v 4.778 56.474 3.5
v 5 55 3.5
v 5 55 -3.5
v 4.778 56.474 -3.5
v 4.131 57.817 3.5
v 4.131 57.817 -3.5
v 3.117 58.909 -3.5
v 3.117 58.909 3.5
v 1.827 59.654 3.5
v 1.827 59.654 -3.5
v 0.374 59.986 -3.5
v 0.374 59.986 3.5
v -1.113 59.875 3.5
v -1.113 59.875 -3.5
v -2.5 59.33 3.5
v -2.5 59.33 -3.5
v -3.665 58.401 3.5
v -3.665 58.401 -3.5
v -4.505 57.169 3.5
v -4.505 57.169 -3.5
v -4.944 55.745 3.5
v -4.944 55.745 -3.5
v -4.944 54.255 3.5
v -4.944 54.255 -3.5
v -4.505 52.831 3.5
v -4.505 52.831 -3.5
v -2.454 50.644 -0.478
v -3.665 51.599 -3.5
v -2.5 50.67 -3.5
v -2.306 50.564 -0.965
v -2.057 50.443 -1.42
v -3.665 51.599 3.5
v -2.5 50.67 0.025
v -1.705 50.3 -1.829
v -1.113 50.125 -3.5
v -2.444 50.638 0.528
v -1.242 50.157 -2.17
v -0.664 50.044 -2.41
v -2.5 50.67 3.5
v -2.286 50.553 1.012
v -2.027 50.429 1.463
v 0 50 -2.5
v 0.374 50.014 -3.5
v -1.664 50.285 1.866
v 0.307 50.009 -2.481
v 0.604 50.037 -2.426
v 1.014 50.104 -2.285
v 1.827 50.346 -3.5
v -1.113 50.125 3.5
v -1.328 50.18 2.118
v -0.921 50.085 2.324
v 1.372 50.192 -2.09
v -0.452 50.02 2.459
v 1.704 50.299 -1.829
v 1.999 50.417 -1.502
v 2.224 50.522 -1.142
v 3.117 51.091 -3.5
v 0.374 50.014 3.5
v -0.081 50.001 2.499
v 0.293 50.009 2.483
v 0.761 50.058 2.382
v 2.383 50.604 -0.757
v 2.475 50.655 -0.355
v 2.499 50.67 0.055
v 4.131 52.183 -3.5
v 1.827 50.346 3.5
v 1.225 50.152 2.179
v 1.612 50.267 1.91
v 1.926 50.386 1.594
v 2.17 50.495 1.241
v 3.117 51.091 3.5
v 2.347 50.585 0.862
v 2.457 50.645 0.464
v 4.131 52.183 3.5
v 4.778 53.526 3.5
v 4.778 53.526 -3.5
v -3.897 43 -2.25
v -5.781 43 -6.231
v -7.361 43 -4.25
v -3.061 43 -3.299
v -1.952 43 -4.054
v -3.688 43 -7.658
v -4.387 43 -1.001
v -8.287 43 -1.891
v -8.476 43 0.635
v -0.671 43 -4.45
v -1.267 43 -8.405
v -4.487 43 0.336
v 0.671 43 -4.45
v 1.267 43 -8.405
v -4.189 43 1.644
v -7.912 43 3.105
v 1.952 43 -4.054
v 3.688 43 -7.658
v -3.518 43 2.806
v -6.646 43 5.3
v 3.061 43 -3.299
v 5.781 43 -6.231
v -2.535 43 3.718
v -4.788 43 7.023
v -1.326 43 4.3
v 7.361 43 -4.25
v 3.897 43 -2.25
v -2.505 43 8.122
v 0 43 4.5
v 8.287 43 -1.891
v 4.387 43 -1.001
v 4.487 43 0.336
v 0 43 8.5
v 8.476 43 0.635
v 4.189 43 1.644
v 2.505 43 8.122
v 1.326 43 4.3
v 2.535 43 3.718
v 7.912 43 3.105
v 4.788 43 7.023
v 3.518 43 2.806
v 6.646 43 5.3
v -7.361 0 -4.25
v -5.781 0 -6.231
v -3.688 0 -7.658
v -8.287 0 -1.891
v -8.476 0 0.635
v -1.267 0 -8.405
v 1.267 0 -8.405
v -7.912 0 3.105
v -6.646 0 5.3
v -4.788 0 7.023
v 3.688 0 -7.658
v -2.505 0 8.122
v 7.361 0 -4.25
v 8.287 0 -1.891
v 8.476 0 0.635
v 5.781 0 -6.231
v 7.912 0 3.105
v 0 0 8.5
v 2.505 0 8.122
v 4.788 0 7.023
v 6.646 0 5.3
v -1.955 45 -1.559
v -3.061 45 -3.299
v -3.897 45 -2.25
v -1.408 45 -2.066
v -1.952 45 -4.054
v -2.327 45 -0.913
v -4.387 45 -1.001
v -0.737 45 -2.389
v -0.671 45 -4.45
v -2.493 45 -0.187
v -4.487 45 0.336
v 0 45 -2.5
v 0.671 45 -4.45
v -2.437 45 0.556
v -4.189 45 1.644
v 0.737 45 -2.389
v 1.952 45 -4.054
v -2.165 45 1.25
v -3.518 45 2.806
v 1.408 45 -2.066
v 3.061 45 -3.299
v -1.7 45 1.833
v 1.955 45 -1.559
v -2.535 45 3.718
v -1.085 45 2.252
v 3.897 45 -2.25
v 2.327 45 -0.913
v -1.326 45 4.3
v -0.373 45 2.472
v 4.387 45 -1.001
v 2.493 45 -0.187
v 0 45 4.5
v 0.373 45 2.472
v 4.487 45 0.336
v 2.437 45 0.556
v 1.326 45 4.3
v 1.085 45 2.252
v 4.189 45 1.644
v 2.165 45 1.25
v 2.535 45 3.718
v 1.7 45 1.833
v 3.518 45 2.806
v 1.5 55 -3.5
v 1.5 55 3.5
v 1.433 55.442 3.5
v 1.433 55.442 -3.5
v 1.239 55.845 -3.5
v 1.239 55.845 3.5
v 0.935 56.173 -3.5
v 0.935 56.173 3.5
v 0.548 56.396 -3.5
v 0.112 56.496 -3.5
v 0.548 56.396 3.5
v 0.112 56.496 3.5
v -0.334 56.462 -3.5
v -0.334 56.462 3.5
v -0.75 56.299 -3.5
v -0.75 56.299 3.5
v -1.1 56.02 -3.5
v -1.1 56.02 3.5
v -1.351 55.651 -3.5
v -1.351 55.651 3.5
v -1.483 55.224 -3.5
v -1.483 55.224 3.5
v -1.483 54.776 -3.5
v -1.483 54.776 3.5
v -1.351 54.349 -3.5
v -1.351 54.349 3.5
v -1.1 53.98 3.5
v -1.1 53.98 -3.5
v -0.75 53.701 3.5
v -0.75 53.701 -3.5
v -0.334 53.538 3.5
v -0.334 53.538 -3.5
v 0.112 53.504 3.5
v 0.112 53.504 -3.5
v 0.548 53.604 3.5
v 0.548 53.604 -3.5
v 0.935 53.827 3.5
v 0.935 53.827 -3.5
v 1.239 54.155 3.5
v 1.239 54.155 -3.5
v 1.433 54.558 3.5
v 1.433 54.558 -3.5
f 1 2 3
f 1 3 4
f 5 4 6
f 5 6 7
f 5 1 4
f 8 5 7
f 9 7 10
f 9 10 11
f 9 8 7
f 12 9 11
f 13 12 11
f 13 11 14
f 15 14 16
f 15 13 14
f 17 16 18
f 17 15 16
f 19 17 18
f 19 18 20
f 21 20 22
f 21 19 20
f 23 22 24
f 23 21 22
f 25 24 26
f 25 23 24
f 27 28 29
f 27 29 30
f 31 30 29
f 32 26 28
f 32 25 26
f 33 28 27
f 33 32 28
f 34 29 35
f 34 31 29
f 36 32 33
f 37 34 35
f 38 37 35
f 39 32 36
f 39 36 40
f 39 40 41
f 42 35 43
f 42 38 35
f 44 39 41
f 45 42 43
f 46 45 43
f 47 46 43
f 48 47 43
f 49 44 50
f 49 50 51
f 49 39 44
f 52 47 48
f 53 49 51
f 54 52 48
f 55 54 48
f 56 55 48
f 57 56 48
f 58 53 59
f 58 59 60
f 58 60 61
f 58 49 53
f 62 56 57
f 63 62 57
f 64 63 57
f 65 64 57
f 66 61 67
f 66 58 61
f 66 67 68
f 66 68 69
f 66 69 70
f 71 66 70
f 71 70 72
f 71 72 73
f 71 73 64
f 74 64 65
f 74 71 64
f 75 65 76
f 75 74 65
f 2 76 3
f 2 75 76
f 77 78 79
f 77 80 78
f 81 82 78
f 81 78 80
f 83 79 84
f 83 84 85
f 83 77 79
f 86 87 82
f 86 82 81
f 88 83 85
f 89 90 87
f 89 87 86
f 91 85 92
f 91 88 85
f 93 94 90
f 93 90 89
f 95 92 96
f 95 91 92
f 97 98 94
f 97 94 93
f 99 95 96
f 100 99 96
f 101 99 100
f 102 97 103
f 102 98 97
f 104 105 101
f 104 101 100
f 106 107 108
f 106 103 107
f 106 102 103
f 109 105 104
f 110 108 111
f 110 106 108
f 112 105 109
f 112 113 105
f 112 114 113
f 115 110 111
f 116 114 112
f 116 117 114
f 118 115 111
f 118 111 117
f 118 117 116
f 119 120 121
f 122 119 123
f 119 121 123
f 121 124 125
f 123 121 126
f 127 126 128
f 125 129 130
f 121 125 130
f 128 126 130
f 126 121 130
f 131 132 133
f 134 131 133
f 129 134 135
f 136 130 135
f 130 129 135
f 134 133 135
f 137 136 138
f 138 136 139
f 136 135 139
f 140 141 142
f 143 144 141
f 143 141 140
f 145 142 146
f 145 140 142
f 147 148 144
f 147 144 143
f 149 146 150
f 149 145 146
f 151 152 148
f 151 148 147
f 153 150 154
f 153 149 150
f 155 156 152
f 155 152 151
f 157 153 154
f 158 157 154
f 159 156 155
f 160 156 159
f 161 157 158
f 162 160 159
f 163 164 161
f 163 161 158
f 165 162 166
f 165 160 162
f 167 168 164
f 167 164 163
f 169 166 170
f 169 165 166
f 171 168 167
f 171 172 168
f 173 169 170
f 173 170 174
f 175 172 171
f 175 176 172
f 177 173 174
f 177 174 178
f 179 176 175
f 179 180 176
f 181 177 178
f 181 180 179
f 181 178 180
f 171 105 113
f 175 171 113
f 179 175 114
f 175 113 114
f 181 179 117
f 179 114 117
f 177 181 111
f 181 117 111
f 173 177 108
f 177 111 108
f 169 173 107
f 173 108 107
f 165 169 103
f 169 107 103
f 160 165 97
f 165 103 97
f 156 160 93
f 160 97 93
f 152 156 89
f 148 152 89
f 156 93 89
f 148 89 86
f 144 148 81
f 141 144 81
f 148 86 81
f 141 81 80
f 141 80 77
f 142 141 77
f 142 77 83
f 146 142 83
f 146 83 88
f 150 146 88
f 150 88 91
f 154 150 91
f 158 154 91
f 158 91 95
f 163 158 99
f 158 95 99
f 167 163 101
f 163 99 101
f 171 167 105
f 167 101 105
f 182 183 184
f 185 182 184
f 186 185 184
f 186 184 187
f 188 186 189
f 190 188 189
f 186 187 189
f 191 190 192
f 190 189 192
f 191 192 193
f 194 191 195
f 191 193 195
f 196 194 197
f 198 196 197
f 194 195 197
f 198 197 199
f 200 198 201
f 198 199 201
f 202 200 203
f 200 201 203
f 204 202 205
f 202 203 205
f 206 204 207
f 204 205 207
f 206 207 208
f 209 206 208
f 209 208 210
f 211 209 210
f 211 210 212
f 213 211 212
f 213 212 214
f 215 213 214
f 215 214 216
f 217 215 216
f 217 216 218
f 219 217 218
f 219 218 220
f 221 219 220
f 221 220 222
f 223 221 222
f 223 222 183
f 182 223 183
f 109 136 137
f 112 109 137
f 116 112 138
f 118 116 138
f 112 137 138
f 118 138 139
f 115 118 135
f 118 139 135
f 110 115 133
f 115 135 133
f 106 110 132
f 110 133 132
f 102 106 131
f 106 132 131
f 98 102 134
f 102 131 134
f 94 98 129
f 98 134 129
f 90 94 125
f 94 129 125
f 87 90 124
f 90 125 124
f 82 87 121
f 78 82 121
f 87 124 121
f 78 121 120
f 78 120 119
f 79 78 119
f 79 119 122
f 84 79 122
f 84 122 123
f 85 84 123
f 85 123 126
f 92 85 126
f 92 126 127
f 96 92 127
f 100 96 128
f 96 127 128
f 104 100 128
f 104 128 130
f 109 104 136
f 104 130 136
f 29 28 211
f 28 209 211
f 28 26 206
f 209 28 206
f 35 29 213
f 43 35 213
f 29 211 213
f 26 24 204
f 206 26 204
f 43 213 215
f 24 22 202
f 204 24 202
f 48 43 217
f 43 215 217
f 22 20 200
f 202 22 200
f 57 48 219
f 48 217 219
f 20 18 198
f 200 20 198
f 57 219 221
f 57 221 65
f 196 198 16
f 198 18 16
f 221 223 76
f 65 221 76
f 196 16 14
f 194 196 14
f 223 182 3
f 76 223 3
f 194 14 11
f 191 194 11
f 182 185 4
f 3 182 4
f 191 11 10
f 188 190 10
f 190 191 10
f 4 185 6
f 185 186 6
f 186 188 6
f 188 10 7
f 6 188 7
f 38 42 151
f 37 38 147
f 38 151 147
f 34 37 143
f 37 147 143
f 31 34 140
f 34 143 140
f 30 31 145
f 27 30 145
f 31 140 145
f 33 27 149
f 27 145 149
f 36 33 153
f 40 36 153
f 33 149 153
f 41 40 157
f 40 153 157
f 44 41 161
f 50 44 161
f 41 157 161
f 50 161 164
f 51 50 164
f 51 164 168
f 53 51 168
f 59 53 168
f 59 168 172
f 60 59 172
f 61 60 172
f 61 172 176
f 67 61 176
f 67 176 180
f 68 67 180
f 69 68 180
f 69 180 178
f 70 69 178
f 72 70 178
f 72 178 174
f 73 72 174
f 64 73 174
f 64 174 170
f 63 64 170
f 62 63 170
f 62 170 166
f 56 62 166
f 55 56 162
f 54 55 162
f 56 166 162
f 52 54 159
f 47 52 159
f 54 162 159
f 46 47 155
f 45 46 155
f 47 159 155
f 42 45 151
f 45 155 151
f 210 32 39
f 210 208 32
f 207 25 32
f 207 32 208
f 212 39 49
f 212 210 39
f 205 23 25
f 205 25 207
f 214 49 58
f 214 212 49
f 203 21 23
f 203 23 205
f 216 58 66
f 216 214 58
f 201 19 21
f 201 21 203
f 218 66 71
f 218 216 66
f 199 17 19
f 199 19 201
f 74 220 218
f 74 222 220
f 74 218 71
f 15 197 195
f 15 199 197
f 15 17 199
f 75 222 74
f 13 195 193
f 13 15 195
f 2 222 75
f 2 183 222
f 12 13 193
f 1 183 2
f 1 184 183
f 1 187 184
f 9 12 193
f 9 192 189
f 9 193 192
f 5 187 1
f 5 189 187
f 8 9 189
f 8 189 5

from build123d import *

# Parameters (mm, degrees)
SKETCH_1_R          = 8.5
EXTRUDE_1_DEPTH     = 43
SKETCH_2_R          = 5
EXTRUDE_2_DEPTH     = 3.5
SKETCH_3_R          = 2.5
EXTRUDE_3_DEPTH     = 9
SKETCH_4_R          = 1.5
CUT_EXTRUDE_1_DEPTH = 10
SKETCH_5_R          = 4.5
SKETCH_5_R_2        = 2.5
EXTRUDE_4_DEPTH     = 2


with BuildPart() as part:
    # 草图1 → 凸台-拉伸1 (new body)
    with BuildSketch(Plane(origin=(0, 0, 0), x_dir=(1, 0, 0), z_dir=(0, 1, 0))):
        with Locations(Location((0, 0, 0), (0, 0, 270))):
            Circle(SKETCH_1_R)
    extrude(amount=EXTRUDE_1_DEPTH)



with BuildPart() as body_2:
    # 草图2 → 凸台-拉伸2 (new, symmetric)
    with BuildSketch(Plane.XY):
        with Locations((0, 55)):
            Circle(SKETCH_2_R)
    extrude(amount=EXTRUDE_2_DEPTH, both=True)


with BuildPart() as part_1:
    add(part.part)

    add(body_2.part)  # 凸台-拉伸3 merges body 2
    # 草图3 → 凸台-拉伸3 (add)
    with BuildSketch(Plane(origin=(0, 43, 0), x_dir=(1, 0, 0), z_dir=(0, 1, 0))):
        with Locations(Location((0, 0, 0), (0, 0, 90))):
            Circle(SKETCH_3_R)
    extrude(amount=EXTRUDE_3_DEPTH)

    # 草图4 → 切除-拉伸1 (cut)
    with BuildSketch(Plane.XY.offset(3.5)):
        with Locations((0, 55)):
            Circle(SKETCH_4_R)
    extrude(amount=-CUT_EXTRUDE_1_DEPTH, mode=Mode.SUBTRACT)

    # 草图5 → 凸台-拉伸4 (add)
    with BuildSketch(Plane(origin=(0, 43, 0), x_dir=(1, 0, 0), z_dir=(0, 1, 0))):
        with Locations(Location((0, 0, 0), (0, 0, 270))):
            Circle(SKETCH_5_R)
        with Locations(Location((0, 0, 0), (0, 0, 90))):
            Circle(SKETCH_5_R_2, mode=Mode.SUBTRACT)
    extrude(amount=EXTRUDE_4_DEPTH)


solid = part_1.part
